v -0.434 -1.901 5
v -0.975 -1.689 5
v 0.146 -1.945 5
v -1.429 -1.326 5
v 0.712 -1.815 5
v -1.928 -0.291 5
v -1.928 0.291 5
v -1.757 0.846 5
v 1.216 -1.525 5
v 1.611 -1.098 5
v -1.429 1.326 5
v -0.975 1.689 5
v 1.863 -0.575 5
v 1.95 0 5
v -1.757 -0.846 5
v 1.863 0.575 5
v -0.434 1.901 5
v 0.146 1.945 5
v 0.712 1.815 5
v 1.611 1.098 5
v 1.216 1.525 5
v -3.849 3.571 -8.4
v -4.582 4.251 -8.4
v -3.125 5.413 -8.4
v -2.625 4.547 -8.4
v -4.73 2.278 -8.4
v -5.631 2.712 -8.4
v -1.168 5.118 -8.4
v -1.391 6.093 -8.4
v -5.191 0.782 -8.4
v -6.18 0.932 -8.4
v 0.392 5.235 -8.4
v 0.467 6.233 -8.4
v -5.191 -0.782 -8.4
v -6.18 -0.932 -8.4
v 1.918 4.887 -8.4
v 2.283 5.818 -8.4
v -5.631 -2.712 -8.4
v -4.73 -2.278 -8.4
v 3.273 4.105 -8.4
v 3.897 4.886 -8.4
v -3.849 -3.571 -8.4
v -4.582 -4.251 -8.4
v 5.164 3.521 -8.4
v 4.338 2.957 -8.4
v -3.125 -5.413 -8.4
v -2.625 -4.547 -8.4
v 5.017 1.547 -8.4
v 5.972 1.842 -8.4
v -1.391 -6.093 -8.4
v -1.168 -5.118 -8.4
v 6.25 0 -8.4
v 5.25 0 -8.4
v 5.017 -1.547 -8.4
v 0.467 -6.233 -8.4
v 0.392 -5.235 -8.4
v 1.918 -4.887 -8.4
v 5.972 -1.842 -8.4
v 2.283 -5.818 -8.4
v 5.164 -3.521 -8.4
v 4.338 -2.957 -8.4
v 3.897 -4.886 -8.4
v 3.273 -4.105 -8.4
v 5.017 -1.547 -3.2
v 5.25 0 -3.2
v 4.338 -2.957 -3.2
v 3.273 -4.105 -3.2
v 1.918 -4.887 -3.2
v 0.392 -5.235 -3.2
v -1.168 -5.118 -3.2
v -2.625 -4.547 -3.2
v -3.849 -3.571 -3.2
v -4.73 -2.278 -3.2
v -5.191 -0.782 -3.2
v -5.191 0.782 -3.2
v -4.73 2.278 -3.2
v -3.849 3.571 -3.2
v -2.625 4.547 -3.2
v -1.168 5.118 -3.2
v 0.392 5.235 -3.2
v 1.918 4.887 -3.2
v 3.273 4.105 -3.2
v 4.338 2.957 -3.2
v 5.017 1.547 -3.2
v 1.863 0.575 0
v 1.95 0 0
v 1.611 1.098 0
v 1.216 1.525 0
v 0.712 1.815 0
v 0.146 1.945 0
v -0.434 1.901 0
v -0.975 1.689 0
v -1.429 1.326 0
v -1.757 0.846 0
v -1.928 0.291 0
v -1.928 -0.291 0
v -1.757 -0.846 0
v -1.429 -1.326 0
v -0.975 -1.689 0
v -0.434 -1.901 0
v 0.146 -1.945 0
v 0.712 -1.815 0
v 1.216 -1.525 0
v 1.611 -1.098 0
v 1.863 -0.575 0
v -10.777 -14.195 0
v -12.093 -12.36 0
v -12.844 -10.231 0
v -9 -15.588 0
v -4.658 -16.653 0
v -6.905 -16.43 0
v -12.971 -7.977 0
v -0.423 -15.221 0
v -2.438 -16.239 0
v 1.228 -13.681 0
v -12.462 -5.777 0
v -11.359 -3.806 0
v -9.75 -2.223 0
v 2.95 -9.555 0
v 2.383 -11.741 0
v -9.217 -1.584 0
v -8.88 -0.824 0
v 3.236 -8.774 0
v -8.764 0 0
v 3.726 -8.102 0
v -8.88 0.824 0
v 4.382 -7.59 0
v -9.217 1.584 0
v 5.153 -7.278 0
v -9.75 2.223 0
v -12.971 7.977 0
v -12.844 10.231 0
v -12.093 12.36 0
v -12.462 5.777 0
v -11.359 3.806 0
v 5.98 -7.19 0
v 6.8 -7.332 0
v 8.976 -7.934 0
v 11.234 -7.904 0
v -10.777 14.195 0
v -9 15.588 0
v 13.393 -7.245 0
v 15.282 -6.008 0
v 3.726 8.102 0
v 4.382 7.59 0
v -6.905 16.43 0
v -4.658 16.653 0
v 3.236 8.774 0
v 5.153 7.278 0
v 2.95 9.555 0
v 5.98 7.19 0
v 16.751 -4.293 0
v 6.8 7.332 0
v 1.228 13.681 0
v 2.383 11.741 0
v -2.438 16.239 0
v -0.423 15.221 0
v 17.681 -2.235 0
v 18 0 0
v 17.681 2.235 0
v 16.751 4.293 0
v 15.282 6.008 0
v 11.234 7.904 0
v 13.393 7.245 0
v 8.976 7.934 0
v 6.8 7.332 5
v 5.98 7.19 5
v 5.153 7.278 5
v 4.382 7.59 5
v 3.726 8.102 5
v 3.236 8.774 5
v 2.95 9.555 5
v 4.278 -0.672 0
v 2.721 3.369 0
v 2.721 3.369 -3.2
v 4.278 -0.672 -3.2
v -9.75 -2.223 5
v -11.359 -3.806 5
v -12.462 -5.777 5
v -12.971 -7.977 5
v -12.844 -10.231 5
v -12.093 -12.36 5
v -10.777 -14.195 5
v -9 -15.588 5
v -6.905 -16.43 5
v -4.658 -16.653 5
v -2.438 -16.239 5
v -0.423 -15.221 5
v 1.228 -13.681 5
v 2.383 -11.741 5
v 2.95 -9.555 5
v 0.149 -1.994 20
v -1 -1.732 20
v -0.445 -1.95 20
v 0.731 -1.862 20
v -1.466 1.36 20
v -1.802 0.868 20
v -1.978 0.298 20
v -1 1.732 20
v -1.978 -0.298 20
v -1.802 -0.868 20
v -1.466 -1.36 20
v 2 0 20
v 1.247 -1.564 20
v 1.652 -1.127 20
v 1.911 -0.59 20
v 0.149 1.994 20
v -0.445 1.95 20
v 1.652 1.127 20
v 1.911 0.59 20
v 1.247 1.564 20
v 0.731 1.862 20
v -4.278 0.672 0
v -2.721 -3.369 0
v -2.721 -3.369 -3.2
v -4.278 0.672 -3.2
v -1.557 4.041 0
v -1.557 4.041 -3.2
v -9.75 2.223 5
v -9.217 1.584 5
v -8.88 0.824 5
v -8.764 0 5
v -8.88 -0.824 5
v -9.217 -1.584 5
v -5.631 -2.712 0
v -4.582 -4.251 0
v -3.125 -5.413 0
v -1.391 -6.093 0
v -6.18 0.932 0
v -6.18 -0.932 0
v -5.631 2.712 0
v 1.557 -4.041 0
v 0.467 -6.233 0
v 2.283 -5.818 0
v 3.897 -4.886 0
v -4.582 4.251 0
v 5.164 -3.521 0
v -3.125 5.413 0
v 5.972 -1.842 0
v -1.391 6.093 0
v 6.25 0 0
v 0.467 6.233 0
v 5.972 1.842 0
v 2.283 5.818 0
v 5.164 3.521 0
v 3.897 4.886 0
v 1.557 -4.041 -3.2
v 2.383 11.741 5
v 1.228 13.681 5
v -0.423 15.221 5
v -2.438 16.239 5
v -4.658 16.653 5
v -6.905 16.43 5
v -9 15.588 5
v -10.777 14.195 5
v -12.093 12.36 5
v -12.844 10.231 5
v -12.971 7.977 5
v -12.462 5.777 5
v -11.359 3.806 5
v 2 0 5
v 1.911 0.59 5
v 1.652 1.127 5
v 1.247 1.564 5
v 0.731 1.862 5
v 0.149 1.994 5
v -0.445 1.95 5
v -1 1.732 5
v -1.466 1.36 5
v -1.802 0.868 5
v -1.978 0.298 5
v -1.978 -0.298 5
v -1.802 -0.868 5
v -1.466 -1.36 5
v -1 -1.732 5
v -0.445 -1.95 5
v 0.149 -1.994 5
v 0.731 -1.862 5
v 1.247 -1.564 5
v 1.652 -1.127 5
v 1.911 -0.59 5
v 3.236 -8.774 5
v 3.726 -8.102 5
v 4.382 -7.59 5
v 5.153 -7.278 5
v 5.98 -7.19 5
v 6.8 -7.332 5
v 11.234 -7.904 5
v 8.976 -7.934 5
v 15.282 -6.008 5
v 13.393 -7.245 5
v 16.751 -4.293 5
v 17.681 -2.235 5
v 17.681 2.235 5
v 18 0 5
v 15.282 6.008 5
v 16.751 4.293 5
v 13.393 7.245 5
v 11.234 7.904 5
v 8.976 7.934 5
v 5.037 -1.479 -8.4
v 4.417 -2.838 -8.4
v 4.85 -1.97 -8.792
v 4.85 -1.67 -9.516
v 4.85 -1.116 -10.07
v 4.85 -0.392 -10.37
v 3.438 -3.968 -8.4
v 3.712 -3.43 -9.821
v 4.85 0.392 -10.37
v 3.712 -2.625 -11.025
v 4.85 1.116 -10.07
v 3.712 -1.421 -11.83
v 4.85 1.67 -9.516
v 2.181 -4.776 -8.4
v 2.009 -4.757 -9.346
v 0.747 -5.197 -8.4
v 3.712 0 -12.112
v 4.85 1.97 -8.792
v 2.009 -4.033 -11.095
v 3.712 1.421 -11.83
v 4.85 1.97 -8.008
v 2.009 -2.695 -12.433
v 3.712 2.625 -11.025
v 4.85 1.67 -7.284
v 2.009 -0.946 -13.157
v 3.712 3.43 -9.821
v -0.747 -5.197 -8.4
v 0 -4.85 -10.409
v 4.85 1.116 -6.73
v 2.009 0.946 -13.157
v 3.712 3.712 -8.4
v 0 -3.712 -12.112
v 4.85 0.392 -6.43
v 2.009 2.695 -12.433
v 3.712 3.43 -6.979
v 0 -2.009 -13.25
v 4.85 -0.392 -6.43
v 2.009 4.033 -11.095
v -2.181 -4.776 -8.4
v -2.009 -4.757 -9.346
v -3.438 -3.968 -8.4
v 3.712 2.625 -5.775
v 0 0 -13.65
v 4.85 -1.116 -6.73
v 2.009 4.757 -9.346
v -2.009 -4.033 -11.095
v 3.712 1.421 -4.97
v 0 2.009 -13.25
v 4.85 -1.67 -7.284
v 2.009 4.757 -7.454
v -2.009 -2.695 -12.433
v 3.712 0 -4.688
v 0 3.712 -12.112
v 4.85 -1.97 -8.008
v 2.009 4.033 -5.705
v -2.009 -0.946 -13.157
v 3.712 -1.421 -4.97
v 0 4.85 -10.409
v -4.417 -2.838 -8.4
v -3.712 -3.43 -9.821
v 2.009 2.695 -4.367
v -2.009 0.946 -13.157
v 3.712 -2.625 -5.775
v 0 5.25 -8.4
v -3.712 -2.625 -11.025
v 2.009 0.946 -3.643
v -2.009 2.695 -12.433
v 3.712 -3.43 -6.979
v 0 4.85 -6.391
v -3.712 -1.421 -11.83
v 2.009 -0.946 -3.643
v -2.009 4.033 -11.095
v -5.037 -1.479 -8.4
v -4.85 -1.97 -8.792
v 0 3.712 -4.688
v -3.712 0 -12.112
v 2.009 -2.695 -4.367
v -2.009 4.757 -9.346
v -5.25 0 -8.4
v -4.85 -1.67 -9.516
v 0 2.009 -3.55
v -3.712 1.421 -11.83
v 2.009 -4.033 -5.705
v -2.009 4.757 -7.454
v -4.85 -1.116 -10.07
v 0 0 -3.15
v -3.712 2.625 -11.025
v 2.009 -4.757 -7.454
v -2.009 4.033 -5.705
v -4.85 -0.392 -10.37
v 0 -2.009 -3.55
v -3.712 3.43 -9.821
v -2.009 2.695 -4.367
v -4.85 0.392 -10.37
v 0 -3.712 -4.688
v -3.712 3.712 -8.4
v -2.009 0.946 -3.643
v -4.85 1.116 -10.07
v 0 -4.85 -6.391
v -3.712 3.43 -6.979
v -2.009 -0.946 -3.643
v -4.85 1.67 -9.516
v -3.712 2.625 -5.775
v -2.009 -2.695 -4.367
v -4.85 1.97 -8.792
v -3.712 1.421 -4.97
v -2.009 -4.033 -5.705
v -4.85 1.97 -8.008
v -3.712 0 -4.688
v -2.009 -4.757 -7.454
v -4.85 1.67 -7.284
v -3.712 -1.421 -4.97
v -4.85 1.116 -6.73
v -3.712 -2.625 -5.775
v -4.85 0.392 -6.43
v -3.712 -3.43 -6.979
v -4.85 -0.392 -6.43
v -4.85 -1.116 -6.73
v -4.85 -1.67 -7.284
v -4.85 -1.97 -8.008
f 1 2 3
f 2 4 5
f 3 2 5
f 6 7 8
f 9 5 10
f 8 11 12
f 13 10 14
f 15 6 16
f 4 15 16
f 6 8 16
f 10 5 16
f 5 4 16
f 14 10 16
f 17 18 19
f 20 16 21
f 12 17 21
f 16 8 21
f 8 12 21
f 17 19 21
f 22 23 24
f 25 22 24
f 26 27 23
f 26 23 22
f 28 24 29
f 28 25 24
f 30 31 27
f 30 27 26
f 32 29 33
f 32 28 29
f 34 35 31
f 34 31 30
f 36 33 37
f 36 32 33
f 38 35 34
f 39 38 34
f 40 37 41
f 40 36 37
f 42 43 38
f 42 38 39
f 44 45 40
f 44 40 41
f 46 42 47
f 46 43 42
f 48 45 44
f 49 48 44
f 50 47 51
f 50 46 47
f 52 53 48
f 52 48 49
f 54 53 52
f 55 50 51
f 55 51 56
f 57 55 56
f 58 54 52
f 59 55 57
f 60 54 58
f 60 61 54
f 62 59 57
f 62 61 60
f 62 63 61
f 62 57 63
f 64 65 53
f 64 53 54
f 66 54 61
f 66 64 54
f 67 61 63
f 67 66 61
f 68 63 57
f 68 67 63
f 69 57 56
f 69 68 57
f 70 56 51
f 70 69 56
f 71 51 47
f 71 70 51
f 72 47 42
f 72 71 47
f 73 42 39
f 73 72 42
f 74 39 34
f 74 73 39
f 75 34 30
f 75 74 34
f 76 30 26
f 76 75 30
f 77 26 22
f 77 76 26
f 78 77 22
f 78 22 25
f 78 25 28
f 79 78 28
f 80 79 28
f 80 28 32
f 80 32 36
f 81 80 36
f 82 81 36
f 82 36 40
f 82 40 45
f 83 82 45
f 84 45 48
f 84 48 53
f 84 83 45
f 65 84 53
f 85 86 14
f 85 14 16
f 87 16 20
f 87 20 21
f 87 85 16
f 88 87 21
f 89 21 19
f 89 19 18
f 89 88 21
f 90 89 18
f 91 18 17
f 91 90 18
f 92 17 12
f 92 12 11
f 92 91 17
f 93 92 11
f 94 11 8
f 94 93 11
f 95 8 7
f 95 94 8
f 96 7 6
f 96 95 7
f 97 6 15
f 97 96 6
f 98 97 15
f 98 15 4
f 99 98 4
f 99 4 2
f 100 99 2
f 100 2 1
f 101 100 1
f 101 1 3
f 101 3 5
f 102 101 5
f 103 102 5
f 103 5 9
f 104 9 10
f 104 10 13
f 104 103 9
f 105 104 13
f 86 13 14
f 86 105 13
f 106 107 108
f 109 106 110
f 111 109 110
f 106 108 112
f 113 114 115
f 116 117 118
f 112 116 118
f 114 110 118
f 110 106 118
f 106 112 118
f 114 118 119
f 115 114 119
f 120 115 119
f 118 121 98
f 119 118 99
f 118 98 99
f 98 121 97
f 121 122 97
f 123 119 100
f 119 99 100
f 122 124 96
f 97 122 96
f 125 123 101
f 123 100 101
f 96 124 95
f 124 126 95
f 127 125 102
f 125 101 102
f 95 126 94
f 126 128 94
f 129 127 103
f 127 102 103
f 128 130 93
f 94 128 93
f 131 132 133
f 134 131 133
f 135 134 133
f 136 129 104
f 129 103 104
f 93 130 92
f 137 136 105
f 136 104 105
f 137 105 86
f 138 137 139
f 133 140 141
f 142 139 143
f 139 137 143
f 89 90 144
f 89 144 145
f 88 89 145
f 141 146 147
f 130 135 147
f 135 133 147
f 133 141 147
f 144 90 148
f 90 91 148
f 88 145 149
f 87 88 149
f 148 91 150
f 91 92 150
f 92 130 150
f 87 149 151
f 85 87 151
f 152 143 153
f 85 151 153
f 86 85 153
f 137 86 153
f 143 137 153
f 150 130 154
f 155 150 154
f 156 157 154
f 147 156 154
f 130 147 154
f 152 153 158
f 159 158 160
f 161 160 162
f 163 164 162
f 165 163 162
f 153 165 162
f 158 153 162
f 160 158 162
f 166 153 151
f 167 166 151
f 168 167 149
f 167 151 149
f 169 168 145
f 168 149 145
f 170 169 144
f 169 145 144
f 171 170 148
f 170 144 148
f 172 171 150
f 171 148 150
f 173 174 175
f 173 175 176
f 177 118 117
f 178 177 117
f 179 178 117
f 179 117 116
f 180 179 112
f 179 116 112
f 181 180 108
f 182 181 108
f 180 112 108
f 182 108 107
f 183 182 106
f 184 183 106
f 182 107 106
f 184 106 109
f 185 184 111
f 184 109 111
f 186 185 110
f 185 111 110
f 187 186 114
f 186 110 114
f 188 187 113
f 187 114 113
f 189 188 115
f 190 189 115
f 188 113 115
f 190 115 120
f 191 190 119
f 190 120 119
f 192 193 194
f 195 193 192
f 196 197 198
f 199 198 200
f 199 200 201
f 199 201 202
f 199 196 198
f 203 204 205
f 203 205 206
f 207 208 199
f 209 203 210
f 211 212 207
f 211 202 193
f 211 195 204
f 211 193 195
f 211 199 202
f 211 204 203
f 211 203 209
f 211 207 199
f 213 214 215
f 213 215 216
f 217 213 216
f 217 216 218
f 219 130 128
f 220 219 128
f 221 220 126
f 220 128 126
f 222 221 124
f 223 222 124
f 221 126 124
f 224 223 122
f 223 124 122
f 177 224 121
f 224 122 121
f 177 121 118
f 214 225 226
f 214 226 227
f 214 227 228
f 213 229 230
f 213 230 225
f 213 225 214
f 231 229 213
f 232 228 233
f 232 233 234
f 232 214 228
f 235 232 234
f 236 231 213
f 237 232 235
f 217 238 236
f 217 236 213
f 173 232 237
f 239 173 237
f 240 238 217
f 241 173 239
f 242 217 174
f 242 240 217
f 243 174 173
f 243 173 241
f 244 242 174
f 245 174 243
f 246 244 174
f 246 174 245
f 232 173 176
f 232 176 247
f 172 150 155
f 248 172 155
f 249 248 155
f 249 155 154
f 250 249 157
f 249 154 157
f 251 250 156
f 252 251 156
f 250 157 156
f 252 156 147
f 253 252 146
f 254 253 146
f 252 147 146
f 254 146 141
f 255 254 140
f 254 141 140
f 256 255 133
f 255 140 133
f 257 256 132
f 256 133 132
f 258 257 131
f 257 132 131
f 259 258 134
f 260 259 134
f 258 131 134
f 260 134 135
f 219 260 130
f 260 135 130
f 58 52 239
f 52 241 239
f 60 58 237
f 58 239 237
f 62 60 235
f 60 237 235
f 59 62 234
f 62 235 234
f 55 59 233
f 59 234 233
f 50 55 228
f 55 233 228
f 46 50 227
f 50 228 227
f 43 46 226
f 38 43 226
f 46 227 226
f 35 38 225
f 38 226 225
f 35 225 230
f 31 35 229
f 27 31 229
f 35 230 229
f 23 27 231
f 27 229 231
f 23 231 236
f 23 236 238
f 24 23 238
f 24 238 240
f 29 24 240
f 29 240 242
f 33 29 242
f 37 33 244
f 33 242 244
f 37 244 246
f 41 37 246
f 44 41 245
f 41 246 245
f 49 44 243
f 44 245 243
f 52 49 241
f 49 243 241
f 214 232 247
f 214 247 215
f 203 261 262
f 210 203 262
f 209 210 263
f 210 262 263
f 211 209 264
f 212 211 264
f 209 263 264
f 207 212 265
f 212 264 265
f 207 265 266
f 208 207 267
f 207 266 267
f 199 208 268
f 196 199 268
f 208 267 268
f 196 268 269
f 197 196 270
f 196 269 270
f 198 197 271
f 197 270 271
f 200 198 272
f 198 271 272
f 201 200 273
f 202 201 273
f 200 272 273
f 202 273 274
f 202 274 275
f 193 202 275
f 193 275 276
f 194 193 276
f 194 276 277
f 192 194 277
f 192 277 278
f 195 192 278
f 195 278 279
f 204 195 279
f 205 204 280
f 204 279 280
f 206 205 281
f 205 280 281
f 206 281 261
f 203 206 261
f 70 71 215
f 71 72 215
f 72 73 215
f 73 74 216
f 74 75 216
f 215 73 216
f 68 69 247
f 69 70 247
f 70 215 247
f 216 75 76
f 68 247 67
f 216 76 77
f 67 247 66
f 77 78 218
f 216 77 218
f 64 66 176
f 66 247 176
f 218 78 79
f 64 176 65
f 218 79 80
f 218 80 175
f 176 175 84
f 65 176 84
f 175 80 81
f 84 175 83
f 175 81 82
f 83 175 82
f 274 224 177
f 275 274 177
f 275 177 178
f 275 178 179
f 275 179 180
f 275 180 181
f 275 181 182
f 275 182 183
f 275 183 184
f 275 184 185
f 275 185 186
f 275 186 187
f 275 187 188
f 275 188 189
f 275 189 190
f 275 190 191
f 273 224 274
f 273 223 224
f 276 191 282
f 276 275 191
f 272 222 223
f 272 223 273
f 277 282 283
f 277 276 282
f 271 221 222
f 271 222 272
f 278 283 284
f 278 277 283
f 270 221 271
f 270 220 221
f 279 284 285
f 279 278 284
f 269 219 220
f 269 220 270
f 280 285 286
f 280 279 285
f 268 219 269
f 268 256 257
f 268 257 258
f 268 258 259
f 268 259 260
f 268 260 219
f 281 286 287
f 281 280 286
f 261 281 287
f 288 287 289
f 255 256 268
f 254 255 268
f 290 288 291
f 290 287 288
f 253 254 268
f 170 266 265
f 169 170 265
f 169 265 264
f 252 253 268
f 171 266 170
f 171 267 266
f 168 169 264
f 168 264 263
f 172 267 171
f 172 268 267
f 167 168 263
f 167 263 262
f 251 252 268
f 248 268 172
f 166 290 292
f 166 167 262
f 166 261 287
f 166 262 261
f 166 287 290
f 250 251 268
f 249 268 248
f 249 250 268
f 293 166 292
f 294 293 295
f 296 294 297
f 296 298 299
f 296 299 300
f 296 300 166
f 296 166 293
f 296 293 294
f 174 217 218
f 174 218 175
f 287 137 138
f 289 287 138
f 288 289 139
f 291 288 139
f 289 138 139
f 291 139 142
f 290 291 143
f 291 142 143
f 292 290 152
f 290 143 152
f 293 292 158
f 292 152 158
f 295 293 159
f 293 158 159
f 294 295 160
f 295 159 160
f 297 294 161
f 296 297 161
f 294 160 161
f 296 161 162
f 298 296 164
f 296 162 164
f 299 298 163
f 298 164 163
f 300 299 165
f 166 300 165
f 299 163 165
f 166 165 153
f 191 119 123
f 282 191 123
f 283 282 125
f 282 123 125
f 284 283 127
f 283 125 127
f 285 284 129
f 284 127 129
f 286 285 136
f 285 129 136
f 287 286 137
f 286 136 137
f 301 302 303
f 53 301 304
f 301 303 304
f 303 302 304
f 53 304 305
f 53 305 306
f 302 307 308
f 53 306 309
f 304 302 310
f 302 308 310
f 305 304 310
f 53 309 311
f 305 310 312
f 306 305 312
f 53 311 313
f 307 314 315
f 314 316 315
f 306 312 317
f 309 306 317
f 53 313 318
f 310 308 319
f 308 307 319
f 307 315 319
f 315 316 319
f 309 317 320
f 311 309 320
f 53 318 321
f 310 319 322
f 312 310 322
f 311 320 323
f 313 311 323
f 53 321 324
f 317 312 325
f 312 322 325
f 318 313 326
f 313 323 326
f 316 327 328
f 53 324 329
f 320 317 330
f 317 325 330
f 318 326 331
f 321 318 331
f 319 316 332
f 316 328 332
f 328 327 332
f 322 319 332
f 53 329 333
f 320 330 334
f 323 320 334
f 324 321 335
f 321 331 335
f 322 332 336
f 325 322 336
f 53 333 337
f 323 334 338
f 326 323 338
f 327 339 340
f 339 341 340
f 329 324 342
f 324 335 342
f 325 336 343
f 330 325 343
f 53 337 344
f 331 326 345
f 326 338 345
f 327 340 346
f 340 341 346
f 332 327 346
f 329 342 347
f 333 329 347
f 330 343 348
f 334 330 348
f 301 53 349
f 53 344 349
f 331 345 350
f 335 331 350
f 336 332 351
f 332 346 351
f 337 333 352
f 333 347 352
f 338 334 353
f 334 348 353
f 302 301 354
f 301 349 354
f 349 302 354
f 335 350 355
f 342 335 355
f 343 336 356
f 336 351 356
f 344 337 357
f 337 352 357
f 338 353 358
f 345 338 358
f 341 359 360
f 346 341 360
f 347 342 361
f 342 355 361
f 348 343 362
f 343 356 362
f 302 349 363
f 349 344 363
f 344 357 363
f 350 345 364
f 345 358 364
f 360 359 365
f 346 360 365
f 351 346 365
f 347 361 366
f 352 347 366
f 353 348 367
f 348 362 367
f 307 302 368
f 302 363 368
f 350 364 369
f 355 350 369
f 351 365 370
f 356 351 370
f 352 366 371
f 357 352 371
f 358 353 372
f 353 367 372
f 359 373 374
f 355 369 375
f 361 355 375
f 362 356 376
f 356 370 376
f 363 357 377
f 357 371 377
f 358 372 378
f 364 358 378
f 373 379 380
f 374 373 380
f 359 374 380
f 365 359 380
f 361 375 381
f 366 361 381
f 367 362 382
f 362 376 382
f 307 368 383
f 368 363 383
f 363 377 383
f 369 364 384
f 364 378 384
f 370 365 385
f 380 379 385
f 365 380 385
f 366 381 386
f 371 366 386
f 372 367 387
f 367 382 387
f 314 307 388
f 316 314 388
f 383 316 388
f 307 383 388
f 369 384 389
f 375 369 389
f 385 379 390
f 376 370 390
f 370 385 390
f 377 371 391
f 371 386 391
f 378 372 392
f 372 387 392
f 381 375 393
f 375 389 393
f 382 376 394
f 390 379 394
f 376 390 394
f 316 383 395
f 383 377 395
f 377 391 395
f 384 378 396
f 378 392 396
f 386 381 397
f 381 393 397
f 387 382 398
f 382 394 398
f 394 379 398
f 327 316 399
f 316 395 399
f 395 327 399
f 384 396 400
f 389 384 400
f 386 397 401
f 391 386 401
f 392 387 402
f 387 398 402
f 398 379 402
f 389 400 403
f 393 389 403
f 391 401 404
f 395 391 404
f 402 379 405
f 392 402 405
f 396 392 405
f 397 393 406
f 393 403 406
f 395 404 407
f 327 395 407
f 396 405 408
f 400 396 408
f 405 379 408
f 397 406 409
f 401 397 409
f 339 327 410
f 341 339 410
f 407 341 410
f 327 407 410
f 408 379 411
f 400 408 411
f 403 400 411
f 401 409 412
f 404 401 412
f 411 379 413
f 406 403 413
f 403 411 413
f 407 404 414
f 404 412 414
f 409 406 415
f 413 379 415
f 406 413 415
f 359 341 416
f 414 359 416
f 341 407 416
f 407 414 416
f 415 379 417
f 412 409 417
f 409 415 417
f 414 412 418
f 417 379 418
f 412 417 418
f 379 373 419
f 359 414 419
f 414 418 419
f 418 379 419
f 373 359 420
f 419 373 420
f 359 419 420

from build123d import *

# Parameters (mm, degrees)
F0_R     = 1.95
F1_DEPTH = 5
F2_R     = 6.25
F3_DEPTH = 3.2
F4_R     = 6.25
F4_R_2   = 5.25
F5_DEPTH = 5.2
F6_R     = 2
F7_DEPTH = 15


# Not quite as in the source:
# - ends of sketch curves that miss each other by under 0.0002 mm in the source are joined


with BuildPart() as f1:
    # F0 (on Top) → F1 (new body)
    with BuildSketch(Plane.XY):
        with BuildLine():
            ThreePointArc((2.9498031466, -9.5550333017), (4.3822075591, -7.5902061417), (6.8, -7.3321211119))
            ThreePointArc((6.8, -7.3321211119), (18, 0), (6.8, 7.3321211119))
            ThreePointArc((6.8, 7.3321211119), (4.3822075591, 7.5902061417), (2.9498031466, 9.5550333017))
            ThreePointArc((2.9498031466, 9.5550333017), (-9, 15.5884572681), (-9.7498031466, 2.2229121898))
            ThreePointArc((-9.7498031466, 2.2229121898), (-8.7644151183, 0), (-9.7498031466, -2.2229121898))
            ThreePointArc((-9.7498031466, -2.2229121898), (-9, -15.5884572681), (2.9498031466, -9.5550333017))
        make_face()
        Circle(F0_R, mode=Mode.SUBTRACT)
    extrude(amount=F1_DEPTH)

    # F6 (on face) → F7 (join)
    with BuildSketch(Plane.XY.offset(5)):
        Circle(F6_R)
    extrude(amount=F7_DEPTH)


with BuildPart() as f3:
    # F2 (on Top) → F3 (new body)
    with BuildSketch(Plane.XY):
        Circle(F2_R)
        Polygon((-1.5568529045, 4.0405703847), (2.7208101467, 3.3685593576), (4.2776630512, -0.6720110271), (1.5568529045, -4.0405703847), (-2.7208101467, -3.3685593576), (-4.2776630512, 0.6720110271), align=None, mode=Mode.SUBTRACT)
    extrude(amount=-F3_DEPTH)

    # F4 (on face) → F5 (join)
    with BuildSketch(Plane(origin=(0, 0, -3.2), x_dir=(1, 0, 0), z_dir=(0, 0, -1))):
        Circle(F4_R)
        Circle(F4_R_2, mode=Mode.SUBTRACT)
    extrude(amount=F5_DEPTH)


with BuildPart() as f9:
    # F8 (on face) → F9 (revolve)
    with BuildSketch(Plane(origin=(0, 0, -8.4), x_dir=(1, 0, 0), z_dir=(0, 0, -1))):
        with BuildLine():
            ThreePointArc((5.2500002044, 0), (0, 5.2500002044), (-5.2500002044, 0))
            Line((-5.2500002044, 0), (5.2500002044, 0))
        make_face()
    revolve(axis=Axis((0, 0, -8.4), (1, 0, 0)))


solid = Compound([f1.part, f3.part, f9.part])
